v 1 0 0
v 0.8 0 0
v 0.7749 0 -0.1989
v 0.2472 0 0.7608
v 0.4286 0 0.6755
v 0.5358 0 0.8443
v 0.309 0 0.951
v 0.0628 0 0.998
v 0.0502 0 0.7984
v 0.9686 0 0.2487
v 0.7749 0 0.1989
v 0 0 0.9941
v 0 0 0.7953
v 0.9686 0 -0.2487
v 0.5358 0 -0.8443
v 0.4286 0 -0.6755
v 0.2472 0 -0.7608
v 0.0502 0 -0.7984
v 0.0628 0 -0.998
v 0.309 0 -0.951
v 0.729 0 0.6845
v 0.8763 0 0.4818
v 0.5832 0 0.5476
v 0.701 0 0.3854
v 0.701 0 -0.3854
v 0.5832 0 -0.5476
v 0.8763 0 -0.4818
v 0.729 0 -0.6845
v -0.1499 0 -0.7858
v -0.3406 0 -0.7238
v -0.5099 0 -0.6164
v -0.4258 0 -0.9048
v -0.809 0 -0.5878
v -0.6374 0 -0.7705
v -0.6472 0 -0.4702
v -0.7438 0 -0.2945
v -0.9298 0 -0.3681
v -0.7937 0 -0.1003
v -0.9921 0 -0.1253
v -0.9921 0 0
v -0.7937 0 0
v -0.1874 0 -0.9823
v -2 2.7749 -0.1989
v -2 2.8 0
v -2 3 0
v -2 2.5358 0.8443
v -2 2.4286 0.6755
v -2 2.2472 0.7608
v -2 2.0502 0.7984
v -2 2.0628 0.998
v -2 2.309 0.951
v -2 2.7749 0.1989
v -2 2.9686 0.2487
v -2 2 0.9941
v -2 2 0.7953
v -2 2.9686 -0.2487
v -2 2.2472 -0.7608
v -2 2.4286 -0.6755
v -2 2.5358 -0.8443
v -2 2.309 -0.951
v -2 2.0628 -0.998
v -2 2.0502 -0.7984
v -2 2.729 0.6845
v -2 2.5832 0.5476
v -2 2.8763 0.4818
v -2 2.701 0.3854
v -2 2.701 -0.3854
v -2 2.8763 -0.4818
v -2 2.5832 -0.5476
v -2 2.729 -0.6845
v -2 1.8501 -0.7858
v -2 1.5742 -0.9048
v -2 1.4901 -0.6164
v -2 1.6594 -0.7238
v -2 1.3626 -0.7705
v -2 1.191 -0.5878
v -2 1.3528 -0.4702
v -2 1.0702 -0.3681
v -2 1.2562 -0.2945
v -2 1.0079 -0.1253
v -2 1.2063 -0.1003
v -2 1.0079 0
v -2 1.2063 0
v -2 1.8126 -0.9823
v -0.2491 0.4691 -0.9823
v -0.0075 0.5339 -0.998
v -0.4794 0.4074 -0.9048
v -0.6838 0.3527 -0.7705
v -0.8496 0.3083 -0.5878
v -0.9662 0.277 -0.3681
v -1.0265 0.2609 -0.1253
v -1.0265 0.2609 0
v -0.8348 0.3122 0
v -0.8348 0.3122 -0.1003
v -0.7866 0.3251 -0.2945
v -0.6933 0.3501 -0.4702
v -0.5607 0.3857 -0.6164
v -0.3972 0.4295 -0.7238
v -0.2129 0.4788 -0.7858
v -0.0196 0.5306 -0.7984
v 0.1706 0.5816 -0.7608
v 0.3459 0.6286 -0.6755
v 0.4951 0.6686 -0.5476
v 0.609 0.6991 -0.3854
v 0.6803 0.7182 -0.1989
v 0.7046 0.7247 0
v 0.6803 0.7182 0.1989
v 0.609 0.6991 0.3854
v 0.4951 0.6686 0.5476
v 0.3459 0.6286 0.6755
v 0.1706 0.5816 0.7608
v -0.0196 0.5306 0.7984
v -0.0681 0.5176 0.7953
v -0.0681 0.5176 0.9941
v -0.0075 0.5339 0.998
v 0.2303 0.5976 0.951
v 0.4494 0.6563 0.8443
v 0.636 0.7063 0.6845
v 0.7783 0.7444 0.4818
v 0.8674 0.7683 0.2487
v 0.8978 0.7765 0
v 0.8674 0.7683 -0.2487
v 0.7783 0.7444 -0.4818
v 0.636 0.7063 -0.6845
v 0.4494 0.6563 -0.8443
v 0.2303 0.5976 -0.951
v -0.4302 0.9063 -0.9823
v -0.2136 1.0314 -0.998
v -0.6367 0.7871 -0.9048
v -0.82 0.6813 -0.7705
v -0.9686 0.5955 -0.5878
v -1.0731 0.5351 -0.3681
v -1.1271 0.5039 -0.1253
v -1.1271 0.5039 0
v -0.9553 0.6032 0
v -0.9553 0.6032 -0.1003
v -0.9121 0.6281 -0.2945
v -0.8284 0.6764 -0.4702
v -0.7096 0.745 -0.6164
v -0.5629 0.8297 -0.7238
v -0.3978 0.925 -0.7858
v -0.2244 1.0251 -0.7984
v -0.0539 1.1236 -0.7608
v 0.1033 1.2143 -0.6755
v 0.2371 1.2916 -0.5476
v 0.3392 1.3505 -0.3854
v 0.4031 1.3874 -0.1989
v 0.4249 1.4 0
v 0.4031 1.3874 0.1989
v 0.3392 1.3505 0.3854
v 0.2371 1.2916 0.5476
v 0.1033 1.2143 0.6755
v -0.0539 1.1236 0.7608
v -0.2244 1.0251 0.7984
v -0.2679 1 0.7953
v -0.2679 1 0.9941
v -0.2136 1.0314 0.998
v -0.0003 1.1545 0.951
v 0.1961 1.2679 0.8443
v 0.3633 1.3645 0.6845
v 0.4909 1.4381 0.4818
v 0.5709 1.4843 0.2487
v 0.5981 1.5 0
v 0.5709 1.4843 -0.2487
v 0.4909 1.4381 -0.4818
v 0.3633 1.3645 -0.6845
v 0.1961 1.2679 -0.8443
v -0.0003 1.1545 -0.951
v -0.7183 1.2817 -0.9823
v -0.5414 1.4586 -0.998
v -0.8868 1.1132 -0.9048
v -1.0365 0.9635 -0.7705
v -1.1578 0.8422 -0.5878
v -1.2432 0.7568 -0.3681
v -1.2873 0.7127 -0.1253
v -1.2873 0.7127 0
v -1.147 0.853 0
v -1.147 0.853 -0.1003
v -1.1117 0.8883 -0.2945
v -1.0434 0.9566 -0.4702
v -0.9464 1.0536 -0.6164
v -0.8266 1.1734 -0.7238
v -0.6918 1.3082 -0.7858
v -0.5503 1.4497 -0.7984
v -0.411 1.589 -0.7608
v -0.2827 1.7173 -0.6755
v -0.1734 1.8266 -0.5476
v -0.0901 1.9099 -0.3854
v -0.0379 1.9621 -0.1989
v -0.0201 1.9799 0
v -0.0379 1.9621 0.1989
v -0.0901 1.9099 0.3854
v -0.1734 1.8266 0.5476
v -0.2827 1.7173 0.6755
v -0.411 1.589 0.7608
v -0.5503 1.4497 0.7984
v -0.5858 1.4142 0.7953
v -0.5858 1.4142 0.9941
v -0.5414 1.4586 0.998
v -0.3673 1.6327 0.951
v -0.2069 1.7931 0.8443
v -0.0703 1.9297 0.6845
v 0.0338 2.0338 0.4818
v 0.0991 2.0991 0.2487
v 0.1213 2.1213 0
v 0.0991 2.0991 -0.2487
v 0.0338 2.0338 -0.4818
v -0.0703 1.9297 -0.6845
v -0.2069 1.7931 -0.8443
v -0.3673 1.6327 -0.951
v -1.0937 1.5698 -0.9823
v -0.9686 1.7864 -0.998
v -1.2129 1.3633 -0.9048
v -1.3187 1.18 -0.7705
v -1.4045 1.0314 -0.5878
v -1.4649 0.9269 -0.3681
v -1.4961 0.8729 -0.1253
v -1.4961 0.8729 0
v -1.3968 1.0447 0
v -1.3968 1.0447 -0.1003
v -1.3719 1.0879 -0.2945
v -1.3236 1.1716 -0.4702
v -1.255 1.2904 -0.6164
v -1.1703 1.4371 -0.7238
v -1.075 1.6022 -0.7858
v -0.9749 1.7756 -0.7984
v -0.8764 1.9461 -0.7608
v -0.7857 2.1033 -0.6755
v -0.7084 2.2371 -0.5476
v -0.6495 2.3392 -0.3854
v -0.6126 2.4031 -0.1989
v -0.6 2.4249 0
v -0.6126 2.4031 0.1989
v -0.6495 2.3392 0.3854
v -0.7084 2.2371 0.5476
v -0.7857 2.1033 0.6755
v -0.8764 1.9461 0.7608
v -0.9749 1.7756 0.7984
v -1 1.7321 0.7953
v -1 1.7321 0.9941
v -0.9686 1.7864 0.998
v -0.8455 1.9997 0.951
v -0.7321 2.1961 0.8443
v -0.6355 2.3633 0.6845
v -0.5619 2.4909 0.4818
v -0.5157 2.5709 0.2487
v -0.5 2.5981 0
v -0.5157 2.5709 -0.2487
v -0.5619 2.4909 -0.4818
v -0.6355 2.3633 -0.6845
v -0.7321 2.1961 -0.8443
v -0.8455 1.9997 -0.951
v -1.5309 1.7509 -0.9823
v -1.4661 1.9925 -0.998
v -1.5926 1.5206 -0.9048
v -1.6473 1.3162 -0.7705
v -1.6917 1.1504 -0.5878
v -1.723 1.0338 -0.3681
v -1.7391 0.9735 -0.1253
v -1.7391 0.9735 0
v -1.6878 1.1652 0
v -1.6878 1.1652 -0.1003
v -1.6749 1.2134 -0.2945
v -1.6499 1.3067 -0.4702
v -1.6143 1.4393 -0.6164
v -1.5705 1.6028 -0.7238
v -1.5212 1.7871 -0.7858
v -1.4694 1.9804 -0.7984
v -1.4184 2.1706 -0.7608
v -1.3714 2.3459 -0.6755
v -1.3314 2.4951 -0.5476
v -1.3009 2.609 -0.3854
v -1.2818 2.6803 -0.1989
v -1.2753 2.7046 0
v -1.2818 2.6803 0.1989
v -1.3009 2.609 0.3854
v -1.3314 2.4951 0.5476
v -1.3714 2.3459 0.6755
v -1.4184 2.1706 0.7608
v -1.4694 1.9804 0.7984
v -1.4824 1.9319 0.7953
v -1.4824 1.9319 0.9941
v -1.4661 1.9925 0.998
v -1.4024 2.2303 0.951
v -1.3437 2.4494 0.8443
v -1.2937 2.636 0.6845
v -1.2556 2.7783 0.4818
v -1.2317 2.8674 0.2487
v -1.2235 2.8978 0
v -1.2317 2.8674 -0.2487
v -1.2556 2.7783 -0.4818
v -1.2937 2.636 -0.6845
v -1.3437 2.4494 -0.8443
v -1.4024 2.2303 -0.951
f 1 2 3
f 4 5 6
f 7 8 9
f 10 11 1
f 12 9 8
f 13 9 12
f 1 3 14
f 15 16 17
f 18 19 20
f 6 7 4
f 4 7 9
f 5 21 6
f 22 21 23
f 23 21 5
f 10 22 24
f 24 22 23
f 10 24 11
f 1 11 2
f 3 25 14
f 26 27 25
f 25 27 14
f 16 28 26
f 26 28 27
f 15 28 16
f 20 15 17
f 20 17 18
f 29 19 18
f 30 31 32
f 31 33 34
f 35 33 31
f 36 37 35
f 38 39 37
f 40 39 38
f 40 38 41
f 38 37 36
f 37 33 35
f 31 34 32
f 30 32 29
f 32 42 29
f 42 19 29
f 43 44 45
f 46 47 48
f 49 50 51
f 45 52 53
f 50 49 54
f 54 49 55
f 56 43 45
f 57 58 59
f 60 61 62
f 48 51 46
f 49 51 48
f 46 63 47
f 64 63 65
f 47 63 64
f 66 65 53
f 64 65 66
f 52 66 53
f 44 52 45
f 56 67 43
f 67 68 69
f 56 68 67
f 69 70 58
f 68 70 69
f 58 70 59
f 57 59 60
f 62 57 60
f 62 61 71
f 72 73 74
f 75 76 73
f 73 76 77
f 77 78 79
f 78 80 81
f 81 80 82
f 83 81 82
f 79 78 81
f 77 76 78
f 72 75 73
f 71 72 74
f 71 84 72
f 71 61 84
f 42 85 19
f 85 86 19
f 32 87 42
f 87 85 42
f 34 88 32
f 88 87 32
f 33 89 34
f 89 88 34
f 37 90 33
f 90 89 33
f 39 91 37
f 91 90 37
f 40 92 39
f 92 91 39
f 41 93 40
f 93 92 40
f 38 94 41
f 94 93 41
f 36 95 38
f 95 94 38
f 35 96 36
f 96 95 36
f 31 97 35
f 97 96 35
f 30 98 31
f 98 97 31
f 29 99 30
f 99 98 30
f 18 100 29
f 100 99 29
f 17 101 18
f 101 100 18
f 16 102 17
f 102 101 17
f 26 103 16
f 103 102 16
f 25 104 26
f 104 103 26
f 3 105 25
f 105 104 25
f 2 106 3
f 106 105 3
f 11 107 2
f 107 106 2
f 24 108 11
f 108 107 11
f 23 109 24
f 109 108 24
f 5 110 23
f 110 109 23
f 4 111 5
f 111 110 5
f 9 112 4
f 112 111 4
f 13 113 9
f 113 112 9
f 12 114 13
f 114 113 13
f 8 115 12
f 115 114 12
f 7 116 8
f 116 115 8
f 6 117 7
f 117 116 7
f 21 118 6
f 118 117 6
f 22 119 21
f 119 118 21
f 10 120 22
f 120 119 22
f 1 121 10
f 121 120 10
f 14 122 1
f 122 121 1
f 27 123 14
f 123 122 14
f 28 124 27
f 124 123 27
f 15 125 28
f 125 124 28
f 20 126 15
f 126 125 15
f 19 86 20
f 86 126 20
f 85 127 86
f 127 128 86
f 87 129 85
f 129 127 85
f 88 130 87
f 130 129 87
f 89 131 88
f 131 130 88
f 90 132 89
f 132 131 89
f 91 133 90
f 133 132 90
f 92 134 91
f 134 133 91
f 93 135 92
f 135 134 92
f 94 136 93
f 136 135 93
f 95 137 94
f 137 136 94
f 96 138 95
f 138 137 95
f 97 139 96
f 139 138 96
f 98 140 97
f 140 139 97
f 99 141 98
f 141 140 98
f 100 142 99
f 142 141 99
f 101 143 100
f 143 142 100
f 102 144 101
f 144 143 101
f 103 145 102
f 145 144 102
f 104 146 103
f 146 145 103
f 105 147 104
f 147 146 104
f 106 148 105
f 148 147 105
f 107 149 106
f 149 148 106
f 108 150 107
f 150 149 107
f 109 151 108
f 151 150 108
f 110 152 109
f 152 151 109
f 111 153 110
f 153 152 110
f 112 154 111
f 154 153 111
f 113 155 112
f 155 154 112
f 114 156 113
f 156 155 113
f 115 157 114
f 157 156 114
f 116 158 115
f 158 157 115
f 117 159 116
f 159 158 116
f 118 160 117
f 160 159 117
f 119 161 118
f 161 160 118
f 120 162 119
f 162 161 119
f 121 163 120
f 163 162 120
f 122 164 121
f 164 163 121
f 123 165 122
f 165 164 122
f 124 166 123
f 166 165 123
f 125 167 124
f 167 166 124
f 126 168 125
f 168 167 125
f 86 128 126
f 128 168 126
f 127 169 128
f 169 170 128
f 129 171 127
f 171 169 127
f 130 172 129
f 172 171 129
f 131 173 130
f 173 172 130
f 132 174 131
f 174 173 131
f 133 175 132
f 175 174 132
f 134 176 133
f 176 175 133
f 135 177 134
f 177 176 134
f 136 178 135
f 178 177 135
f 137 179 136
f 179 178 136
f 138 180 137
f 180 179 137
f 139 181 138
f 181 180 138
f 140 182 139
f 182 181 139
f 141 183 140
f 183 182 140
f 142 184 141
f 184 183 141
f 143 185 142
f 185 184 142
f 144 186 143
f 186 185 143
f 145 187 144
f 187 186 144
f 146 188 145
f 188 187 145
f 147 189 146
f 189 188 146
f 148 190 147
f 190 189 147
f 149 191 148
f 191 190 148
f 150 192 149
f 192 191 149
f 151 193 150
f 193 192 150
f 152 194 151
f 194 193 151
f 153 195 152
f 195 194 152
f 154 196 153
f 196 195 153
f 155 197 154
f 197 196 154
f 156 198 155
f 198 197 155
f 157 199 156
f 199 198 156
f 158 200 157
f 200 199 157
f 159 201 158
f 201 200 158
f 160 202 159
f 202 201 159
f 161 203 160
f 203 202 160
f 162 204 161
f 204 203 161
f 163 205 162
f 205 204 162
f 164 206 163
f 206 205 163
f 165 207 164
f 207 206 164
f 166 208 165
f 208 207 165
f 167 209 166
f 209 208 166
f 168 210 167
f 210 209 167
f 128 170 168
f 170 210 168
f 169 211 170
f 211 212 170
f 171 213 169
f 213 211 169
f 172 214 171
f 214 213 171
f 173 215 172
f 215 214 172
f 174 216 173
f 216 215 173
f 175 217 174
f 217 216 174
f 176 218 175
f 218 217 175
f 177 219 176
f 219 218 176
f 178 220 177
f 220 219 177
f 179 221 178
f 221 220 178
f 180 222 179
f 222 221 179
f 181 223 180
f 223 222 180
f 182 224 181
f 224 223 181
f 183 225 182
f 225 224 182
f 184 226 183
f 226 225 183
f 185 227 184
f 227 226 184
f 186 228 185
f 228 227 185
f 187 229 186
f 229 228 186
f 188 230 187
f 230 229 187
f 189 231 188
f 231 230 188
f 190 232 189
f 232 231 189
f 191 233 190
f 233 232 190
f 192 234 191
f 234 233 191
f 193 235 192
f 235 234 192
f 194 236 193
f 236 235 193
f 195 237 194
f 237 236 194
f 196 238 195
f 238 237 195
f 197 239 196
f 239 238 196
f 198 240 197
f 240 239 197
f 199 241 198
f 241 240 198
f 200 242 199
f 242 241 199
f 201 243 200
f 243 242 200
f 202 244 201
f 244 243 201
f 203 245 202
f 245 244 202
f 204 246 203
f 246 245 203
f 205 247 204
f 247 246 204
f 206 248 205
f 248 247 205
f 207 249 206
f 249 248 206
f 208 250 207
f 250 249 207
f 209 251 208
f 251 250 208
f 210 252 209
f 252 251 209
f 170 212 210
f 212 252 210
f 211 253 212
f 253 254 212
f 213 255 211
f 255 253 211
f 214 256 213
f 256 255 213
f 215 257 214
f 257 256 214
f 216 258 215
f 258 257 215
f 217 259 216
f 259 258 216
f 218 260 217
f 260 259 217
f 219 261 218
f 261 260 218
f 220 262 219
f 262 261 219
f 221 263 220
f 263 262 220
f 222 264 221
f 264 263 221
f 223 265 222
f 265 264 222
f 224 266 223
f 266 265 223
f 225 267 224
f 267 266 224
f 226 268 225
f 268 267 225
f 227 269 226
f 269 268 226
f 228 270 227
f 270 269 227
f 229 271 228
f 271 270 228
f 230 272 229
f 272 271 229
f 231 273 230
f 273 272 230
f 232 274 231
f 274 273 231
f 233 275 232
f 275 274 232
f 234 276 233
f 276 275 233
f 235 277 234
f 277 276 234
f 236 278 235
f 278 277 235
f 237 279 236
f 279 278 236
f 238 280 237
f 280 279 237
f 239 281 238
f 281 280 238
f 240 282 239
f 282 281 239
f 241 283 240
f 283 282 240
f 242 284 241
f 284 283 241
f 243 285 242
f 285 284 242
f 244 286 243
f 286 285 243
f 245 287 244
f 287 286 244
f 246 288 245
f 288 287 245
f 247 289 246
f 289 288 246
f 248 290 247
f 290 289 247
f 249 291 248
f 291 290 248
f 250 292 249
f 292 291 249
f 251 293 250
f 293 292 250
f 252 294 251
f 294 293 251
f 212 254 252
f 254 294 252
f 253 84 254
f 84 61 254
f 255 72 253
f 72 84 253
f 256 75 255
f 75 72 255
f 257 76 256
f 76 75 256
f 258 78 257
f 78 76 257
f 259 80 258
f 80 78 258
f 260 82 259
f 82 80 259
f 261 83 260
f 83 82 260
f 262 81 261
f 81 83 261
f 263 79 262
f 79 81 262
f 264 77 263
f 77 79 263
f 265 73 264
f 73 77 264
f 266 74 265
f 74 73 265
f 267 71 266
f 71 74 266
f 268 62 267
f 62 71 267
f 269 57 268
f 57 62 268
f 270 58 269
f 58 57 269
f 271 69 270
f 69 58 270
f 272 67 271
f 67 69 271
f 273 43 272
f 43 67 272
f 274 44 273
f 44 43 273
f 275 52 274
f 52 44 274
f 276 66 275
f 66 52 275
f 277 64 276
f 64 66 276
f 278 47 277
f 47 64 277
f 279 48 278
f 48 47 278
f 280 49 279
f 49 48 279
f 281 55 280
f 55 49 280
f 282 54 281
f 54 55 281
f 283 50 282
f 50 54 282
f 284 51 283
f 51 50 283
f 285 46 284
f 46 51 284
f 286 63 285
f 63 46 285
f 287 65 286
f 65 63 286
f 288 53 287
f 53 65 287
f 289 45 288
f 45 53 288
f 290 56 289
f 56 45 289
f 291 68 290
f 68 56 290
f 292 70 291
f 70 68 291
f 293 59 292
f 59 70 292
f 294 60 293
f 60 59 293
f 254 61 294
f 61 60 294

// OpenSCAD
// The angle of the turn piece
angle=90; // [360]
// Whether or not the track should be reflected
reflect = false;


module turn(size=1,angle=90,reflect=false,$fn=$fn) {
    //TODO
    mirror([reflect?1:0,0,0])
    translate([-size*2,0,0])
    rotate_extrude(angle = angle) {
        translate([size*2,0,0])
        track_shape(size);
    }
}

/* private */ module track_shape(size) {
    difference(){
        circle(size);
        union(){
            translate([-size,0,0])
            square(size);
            circle(size*0.8);
        }
    }
}

turn(1,angle=angle,reflect=reflect,$fn=25);
translate([0,0,5])
track_shape(1);
